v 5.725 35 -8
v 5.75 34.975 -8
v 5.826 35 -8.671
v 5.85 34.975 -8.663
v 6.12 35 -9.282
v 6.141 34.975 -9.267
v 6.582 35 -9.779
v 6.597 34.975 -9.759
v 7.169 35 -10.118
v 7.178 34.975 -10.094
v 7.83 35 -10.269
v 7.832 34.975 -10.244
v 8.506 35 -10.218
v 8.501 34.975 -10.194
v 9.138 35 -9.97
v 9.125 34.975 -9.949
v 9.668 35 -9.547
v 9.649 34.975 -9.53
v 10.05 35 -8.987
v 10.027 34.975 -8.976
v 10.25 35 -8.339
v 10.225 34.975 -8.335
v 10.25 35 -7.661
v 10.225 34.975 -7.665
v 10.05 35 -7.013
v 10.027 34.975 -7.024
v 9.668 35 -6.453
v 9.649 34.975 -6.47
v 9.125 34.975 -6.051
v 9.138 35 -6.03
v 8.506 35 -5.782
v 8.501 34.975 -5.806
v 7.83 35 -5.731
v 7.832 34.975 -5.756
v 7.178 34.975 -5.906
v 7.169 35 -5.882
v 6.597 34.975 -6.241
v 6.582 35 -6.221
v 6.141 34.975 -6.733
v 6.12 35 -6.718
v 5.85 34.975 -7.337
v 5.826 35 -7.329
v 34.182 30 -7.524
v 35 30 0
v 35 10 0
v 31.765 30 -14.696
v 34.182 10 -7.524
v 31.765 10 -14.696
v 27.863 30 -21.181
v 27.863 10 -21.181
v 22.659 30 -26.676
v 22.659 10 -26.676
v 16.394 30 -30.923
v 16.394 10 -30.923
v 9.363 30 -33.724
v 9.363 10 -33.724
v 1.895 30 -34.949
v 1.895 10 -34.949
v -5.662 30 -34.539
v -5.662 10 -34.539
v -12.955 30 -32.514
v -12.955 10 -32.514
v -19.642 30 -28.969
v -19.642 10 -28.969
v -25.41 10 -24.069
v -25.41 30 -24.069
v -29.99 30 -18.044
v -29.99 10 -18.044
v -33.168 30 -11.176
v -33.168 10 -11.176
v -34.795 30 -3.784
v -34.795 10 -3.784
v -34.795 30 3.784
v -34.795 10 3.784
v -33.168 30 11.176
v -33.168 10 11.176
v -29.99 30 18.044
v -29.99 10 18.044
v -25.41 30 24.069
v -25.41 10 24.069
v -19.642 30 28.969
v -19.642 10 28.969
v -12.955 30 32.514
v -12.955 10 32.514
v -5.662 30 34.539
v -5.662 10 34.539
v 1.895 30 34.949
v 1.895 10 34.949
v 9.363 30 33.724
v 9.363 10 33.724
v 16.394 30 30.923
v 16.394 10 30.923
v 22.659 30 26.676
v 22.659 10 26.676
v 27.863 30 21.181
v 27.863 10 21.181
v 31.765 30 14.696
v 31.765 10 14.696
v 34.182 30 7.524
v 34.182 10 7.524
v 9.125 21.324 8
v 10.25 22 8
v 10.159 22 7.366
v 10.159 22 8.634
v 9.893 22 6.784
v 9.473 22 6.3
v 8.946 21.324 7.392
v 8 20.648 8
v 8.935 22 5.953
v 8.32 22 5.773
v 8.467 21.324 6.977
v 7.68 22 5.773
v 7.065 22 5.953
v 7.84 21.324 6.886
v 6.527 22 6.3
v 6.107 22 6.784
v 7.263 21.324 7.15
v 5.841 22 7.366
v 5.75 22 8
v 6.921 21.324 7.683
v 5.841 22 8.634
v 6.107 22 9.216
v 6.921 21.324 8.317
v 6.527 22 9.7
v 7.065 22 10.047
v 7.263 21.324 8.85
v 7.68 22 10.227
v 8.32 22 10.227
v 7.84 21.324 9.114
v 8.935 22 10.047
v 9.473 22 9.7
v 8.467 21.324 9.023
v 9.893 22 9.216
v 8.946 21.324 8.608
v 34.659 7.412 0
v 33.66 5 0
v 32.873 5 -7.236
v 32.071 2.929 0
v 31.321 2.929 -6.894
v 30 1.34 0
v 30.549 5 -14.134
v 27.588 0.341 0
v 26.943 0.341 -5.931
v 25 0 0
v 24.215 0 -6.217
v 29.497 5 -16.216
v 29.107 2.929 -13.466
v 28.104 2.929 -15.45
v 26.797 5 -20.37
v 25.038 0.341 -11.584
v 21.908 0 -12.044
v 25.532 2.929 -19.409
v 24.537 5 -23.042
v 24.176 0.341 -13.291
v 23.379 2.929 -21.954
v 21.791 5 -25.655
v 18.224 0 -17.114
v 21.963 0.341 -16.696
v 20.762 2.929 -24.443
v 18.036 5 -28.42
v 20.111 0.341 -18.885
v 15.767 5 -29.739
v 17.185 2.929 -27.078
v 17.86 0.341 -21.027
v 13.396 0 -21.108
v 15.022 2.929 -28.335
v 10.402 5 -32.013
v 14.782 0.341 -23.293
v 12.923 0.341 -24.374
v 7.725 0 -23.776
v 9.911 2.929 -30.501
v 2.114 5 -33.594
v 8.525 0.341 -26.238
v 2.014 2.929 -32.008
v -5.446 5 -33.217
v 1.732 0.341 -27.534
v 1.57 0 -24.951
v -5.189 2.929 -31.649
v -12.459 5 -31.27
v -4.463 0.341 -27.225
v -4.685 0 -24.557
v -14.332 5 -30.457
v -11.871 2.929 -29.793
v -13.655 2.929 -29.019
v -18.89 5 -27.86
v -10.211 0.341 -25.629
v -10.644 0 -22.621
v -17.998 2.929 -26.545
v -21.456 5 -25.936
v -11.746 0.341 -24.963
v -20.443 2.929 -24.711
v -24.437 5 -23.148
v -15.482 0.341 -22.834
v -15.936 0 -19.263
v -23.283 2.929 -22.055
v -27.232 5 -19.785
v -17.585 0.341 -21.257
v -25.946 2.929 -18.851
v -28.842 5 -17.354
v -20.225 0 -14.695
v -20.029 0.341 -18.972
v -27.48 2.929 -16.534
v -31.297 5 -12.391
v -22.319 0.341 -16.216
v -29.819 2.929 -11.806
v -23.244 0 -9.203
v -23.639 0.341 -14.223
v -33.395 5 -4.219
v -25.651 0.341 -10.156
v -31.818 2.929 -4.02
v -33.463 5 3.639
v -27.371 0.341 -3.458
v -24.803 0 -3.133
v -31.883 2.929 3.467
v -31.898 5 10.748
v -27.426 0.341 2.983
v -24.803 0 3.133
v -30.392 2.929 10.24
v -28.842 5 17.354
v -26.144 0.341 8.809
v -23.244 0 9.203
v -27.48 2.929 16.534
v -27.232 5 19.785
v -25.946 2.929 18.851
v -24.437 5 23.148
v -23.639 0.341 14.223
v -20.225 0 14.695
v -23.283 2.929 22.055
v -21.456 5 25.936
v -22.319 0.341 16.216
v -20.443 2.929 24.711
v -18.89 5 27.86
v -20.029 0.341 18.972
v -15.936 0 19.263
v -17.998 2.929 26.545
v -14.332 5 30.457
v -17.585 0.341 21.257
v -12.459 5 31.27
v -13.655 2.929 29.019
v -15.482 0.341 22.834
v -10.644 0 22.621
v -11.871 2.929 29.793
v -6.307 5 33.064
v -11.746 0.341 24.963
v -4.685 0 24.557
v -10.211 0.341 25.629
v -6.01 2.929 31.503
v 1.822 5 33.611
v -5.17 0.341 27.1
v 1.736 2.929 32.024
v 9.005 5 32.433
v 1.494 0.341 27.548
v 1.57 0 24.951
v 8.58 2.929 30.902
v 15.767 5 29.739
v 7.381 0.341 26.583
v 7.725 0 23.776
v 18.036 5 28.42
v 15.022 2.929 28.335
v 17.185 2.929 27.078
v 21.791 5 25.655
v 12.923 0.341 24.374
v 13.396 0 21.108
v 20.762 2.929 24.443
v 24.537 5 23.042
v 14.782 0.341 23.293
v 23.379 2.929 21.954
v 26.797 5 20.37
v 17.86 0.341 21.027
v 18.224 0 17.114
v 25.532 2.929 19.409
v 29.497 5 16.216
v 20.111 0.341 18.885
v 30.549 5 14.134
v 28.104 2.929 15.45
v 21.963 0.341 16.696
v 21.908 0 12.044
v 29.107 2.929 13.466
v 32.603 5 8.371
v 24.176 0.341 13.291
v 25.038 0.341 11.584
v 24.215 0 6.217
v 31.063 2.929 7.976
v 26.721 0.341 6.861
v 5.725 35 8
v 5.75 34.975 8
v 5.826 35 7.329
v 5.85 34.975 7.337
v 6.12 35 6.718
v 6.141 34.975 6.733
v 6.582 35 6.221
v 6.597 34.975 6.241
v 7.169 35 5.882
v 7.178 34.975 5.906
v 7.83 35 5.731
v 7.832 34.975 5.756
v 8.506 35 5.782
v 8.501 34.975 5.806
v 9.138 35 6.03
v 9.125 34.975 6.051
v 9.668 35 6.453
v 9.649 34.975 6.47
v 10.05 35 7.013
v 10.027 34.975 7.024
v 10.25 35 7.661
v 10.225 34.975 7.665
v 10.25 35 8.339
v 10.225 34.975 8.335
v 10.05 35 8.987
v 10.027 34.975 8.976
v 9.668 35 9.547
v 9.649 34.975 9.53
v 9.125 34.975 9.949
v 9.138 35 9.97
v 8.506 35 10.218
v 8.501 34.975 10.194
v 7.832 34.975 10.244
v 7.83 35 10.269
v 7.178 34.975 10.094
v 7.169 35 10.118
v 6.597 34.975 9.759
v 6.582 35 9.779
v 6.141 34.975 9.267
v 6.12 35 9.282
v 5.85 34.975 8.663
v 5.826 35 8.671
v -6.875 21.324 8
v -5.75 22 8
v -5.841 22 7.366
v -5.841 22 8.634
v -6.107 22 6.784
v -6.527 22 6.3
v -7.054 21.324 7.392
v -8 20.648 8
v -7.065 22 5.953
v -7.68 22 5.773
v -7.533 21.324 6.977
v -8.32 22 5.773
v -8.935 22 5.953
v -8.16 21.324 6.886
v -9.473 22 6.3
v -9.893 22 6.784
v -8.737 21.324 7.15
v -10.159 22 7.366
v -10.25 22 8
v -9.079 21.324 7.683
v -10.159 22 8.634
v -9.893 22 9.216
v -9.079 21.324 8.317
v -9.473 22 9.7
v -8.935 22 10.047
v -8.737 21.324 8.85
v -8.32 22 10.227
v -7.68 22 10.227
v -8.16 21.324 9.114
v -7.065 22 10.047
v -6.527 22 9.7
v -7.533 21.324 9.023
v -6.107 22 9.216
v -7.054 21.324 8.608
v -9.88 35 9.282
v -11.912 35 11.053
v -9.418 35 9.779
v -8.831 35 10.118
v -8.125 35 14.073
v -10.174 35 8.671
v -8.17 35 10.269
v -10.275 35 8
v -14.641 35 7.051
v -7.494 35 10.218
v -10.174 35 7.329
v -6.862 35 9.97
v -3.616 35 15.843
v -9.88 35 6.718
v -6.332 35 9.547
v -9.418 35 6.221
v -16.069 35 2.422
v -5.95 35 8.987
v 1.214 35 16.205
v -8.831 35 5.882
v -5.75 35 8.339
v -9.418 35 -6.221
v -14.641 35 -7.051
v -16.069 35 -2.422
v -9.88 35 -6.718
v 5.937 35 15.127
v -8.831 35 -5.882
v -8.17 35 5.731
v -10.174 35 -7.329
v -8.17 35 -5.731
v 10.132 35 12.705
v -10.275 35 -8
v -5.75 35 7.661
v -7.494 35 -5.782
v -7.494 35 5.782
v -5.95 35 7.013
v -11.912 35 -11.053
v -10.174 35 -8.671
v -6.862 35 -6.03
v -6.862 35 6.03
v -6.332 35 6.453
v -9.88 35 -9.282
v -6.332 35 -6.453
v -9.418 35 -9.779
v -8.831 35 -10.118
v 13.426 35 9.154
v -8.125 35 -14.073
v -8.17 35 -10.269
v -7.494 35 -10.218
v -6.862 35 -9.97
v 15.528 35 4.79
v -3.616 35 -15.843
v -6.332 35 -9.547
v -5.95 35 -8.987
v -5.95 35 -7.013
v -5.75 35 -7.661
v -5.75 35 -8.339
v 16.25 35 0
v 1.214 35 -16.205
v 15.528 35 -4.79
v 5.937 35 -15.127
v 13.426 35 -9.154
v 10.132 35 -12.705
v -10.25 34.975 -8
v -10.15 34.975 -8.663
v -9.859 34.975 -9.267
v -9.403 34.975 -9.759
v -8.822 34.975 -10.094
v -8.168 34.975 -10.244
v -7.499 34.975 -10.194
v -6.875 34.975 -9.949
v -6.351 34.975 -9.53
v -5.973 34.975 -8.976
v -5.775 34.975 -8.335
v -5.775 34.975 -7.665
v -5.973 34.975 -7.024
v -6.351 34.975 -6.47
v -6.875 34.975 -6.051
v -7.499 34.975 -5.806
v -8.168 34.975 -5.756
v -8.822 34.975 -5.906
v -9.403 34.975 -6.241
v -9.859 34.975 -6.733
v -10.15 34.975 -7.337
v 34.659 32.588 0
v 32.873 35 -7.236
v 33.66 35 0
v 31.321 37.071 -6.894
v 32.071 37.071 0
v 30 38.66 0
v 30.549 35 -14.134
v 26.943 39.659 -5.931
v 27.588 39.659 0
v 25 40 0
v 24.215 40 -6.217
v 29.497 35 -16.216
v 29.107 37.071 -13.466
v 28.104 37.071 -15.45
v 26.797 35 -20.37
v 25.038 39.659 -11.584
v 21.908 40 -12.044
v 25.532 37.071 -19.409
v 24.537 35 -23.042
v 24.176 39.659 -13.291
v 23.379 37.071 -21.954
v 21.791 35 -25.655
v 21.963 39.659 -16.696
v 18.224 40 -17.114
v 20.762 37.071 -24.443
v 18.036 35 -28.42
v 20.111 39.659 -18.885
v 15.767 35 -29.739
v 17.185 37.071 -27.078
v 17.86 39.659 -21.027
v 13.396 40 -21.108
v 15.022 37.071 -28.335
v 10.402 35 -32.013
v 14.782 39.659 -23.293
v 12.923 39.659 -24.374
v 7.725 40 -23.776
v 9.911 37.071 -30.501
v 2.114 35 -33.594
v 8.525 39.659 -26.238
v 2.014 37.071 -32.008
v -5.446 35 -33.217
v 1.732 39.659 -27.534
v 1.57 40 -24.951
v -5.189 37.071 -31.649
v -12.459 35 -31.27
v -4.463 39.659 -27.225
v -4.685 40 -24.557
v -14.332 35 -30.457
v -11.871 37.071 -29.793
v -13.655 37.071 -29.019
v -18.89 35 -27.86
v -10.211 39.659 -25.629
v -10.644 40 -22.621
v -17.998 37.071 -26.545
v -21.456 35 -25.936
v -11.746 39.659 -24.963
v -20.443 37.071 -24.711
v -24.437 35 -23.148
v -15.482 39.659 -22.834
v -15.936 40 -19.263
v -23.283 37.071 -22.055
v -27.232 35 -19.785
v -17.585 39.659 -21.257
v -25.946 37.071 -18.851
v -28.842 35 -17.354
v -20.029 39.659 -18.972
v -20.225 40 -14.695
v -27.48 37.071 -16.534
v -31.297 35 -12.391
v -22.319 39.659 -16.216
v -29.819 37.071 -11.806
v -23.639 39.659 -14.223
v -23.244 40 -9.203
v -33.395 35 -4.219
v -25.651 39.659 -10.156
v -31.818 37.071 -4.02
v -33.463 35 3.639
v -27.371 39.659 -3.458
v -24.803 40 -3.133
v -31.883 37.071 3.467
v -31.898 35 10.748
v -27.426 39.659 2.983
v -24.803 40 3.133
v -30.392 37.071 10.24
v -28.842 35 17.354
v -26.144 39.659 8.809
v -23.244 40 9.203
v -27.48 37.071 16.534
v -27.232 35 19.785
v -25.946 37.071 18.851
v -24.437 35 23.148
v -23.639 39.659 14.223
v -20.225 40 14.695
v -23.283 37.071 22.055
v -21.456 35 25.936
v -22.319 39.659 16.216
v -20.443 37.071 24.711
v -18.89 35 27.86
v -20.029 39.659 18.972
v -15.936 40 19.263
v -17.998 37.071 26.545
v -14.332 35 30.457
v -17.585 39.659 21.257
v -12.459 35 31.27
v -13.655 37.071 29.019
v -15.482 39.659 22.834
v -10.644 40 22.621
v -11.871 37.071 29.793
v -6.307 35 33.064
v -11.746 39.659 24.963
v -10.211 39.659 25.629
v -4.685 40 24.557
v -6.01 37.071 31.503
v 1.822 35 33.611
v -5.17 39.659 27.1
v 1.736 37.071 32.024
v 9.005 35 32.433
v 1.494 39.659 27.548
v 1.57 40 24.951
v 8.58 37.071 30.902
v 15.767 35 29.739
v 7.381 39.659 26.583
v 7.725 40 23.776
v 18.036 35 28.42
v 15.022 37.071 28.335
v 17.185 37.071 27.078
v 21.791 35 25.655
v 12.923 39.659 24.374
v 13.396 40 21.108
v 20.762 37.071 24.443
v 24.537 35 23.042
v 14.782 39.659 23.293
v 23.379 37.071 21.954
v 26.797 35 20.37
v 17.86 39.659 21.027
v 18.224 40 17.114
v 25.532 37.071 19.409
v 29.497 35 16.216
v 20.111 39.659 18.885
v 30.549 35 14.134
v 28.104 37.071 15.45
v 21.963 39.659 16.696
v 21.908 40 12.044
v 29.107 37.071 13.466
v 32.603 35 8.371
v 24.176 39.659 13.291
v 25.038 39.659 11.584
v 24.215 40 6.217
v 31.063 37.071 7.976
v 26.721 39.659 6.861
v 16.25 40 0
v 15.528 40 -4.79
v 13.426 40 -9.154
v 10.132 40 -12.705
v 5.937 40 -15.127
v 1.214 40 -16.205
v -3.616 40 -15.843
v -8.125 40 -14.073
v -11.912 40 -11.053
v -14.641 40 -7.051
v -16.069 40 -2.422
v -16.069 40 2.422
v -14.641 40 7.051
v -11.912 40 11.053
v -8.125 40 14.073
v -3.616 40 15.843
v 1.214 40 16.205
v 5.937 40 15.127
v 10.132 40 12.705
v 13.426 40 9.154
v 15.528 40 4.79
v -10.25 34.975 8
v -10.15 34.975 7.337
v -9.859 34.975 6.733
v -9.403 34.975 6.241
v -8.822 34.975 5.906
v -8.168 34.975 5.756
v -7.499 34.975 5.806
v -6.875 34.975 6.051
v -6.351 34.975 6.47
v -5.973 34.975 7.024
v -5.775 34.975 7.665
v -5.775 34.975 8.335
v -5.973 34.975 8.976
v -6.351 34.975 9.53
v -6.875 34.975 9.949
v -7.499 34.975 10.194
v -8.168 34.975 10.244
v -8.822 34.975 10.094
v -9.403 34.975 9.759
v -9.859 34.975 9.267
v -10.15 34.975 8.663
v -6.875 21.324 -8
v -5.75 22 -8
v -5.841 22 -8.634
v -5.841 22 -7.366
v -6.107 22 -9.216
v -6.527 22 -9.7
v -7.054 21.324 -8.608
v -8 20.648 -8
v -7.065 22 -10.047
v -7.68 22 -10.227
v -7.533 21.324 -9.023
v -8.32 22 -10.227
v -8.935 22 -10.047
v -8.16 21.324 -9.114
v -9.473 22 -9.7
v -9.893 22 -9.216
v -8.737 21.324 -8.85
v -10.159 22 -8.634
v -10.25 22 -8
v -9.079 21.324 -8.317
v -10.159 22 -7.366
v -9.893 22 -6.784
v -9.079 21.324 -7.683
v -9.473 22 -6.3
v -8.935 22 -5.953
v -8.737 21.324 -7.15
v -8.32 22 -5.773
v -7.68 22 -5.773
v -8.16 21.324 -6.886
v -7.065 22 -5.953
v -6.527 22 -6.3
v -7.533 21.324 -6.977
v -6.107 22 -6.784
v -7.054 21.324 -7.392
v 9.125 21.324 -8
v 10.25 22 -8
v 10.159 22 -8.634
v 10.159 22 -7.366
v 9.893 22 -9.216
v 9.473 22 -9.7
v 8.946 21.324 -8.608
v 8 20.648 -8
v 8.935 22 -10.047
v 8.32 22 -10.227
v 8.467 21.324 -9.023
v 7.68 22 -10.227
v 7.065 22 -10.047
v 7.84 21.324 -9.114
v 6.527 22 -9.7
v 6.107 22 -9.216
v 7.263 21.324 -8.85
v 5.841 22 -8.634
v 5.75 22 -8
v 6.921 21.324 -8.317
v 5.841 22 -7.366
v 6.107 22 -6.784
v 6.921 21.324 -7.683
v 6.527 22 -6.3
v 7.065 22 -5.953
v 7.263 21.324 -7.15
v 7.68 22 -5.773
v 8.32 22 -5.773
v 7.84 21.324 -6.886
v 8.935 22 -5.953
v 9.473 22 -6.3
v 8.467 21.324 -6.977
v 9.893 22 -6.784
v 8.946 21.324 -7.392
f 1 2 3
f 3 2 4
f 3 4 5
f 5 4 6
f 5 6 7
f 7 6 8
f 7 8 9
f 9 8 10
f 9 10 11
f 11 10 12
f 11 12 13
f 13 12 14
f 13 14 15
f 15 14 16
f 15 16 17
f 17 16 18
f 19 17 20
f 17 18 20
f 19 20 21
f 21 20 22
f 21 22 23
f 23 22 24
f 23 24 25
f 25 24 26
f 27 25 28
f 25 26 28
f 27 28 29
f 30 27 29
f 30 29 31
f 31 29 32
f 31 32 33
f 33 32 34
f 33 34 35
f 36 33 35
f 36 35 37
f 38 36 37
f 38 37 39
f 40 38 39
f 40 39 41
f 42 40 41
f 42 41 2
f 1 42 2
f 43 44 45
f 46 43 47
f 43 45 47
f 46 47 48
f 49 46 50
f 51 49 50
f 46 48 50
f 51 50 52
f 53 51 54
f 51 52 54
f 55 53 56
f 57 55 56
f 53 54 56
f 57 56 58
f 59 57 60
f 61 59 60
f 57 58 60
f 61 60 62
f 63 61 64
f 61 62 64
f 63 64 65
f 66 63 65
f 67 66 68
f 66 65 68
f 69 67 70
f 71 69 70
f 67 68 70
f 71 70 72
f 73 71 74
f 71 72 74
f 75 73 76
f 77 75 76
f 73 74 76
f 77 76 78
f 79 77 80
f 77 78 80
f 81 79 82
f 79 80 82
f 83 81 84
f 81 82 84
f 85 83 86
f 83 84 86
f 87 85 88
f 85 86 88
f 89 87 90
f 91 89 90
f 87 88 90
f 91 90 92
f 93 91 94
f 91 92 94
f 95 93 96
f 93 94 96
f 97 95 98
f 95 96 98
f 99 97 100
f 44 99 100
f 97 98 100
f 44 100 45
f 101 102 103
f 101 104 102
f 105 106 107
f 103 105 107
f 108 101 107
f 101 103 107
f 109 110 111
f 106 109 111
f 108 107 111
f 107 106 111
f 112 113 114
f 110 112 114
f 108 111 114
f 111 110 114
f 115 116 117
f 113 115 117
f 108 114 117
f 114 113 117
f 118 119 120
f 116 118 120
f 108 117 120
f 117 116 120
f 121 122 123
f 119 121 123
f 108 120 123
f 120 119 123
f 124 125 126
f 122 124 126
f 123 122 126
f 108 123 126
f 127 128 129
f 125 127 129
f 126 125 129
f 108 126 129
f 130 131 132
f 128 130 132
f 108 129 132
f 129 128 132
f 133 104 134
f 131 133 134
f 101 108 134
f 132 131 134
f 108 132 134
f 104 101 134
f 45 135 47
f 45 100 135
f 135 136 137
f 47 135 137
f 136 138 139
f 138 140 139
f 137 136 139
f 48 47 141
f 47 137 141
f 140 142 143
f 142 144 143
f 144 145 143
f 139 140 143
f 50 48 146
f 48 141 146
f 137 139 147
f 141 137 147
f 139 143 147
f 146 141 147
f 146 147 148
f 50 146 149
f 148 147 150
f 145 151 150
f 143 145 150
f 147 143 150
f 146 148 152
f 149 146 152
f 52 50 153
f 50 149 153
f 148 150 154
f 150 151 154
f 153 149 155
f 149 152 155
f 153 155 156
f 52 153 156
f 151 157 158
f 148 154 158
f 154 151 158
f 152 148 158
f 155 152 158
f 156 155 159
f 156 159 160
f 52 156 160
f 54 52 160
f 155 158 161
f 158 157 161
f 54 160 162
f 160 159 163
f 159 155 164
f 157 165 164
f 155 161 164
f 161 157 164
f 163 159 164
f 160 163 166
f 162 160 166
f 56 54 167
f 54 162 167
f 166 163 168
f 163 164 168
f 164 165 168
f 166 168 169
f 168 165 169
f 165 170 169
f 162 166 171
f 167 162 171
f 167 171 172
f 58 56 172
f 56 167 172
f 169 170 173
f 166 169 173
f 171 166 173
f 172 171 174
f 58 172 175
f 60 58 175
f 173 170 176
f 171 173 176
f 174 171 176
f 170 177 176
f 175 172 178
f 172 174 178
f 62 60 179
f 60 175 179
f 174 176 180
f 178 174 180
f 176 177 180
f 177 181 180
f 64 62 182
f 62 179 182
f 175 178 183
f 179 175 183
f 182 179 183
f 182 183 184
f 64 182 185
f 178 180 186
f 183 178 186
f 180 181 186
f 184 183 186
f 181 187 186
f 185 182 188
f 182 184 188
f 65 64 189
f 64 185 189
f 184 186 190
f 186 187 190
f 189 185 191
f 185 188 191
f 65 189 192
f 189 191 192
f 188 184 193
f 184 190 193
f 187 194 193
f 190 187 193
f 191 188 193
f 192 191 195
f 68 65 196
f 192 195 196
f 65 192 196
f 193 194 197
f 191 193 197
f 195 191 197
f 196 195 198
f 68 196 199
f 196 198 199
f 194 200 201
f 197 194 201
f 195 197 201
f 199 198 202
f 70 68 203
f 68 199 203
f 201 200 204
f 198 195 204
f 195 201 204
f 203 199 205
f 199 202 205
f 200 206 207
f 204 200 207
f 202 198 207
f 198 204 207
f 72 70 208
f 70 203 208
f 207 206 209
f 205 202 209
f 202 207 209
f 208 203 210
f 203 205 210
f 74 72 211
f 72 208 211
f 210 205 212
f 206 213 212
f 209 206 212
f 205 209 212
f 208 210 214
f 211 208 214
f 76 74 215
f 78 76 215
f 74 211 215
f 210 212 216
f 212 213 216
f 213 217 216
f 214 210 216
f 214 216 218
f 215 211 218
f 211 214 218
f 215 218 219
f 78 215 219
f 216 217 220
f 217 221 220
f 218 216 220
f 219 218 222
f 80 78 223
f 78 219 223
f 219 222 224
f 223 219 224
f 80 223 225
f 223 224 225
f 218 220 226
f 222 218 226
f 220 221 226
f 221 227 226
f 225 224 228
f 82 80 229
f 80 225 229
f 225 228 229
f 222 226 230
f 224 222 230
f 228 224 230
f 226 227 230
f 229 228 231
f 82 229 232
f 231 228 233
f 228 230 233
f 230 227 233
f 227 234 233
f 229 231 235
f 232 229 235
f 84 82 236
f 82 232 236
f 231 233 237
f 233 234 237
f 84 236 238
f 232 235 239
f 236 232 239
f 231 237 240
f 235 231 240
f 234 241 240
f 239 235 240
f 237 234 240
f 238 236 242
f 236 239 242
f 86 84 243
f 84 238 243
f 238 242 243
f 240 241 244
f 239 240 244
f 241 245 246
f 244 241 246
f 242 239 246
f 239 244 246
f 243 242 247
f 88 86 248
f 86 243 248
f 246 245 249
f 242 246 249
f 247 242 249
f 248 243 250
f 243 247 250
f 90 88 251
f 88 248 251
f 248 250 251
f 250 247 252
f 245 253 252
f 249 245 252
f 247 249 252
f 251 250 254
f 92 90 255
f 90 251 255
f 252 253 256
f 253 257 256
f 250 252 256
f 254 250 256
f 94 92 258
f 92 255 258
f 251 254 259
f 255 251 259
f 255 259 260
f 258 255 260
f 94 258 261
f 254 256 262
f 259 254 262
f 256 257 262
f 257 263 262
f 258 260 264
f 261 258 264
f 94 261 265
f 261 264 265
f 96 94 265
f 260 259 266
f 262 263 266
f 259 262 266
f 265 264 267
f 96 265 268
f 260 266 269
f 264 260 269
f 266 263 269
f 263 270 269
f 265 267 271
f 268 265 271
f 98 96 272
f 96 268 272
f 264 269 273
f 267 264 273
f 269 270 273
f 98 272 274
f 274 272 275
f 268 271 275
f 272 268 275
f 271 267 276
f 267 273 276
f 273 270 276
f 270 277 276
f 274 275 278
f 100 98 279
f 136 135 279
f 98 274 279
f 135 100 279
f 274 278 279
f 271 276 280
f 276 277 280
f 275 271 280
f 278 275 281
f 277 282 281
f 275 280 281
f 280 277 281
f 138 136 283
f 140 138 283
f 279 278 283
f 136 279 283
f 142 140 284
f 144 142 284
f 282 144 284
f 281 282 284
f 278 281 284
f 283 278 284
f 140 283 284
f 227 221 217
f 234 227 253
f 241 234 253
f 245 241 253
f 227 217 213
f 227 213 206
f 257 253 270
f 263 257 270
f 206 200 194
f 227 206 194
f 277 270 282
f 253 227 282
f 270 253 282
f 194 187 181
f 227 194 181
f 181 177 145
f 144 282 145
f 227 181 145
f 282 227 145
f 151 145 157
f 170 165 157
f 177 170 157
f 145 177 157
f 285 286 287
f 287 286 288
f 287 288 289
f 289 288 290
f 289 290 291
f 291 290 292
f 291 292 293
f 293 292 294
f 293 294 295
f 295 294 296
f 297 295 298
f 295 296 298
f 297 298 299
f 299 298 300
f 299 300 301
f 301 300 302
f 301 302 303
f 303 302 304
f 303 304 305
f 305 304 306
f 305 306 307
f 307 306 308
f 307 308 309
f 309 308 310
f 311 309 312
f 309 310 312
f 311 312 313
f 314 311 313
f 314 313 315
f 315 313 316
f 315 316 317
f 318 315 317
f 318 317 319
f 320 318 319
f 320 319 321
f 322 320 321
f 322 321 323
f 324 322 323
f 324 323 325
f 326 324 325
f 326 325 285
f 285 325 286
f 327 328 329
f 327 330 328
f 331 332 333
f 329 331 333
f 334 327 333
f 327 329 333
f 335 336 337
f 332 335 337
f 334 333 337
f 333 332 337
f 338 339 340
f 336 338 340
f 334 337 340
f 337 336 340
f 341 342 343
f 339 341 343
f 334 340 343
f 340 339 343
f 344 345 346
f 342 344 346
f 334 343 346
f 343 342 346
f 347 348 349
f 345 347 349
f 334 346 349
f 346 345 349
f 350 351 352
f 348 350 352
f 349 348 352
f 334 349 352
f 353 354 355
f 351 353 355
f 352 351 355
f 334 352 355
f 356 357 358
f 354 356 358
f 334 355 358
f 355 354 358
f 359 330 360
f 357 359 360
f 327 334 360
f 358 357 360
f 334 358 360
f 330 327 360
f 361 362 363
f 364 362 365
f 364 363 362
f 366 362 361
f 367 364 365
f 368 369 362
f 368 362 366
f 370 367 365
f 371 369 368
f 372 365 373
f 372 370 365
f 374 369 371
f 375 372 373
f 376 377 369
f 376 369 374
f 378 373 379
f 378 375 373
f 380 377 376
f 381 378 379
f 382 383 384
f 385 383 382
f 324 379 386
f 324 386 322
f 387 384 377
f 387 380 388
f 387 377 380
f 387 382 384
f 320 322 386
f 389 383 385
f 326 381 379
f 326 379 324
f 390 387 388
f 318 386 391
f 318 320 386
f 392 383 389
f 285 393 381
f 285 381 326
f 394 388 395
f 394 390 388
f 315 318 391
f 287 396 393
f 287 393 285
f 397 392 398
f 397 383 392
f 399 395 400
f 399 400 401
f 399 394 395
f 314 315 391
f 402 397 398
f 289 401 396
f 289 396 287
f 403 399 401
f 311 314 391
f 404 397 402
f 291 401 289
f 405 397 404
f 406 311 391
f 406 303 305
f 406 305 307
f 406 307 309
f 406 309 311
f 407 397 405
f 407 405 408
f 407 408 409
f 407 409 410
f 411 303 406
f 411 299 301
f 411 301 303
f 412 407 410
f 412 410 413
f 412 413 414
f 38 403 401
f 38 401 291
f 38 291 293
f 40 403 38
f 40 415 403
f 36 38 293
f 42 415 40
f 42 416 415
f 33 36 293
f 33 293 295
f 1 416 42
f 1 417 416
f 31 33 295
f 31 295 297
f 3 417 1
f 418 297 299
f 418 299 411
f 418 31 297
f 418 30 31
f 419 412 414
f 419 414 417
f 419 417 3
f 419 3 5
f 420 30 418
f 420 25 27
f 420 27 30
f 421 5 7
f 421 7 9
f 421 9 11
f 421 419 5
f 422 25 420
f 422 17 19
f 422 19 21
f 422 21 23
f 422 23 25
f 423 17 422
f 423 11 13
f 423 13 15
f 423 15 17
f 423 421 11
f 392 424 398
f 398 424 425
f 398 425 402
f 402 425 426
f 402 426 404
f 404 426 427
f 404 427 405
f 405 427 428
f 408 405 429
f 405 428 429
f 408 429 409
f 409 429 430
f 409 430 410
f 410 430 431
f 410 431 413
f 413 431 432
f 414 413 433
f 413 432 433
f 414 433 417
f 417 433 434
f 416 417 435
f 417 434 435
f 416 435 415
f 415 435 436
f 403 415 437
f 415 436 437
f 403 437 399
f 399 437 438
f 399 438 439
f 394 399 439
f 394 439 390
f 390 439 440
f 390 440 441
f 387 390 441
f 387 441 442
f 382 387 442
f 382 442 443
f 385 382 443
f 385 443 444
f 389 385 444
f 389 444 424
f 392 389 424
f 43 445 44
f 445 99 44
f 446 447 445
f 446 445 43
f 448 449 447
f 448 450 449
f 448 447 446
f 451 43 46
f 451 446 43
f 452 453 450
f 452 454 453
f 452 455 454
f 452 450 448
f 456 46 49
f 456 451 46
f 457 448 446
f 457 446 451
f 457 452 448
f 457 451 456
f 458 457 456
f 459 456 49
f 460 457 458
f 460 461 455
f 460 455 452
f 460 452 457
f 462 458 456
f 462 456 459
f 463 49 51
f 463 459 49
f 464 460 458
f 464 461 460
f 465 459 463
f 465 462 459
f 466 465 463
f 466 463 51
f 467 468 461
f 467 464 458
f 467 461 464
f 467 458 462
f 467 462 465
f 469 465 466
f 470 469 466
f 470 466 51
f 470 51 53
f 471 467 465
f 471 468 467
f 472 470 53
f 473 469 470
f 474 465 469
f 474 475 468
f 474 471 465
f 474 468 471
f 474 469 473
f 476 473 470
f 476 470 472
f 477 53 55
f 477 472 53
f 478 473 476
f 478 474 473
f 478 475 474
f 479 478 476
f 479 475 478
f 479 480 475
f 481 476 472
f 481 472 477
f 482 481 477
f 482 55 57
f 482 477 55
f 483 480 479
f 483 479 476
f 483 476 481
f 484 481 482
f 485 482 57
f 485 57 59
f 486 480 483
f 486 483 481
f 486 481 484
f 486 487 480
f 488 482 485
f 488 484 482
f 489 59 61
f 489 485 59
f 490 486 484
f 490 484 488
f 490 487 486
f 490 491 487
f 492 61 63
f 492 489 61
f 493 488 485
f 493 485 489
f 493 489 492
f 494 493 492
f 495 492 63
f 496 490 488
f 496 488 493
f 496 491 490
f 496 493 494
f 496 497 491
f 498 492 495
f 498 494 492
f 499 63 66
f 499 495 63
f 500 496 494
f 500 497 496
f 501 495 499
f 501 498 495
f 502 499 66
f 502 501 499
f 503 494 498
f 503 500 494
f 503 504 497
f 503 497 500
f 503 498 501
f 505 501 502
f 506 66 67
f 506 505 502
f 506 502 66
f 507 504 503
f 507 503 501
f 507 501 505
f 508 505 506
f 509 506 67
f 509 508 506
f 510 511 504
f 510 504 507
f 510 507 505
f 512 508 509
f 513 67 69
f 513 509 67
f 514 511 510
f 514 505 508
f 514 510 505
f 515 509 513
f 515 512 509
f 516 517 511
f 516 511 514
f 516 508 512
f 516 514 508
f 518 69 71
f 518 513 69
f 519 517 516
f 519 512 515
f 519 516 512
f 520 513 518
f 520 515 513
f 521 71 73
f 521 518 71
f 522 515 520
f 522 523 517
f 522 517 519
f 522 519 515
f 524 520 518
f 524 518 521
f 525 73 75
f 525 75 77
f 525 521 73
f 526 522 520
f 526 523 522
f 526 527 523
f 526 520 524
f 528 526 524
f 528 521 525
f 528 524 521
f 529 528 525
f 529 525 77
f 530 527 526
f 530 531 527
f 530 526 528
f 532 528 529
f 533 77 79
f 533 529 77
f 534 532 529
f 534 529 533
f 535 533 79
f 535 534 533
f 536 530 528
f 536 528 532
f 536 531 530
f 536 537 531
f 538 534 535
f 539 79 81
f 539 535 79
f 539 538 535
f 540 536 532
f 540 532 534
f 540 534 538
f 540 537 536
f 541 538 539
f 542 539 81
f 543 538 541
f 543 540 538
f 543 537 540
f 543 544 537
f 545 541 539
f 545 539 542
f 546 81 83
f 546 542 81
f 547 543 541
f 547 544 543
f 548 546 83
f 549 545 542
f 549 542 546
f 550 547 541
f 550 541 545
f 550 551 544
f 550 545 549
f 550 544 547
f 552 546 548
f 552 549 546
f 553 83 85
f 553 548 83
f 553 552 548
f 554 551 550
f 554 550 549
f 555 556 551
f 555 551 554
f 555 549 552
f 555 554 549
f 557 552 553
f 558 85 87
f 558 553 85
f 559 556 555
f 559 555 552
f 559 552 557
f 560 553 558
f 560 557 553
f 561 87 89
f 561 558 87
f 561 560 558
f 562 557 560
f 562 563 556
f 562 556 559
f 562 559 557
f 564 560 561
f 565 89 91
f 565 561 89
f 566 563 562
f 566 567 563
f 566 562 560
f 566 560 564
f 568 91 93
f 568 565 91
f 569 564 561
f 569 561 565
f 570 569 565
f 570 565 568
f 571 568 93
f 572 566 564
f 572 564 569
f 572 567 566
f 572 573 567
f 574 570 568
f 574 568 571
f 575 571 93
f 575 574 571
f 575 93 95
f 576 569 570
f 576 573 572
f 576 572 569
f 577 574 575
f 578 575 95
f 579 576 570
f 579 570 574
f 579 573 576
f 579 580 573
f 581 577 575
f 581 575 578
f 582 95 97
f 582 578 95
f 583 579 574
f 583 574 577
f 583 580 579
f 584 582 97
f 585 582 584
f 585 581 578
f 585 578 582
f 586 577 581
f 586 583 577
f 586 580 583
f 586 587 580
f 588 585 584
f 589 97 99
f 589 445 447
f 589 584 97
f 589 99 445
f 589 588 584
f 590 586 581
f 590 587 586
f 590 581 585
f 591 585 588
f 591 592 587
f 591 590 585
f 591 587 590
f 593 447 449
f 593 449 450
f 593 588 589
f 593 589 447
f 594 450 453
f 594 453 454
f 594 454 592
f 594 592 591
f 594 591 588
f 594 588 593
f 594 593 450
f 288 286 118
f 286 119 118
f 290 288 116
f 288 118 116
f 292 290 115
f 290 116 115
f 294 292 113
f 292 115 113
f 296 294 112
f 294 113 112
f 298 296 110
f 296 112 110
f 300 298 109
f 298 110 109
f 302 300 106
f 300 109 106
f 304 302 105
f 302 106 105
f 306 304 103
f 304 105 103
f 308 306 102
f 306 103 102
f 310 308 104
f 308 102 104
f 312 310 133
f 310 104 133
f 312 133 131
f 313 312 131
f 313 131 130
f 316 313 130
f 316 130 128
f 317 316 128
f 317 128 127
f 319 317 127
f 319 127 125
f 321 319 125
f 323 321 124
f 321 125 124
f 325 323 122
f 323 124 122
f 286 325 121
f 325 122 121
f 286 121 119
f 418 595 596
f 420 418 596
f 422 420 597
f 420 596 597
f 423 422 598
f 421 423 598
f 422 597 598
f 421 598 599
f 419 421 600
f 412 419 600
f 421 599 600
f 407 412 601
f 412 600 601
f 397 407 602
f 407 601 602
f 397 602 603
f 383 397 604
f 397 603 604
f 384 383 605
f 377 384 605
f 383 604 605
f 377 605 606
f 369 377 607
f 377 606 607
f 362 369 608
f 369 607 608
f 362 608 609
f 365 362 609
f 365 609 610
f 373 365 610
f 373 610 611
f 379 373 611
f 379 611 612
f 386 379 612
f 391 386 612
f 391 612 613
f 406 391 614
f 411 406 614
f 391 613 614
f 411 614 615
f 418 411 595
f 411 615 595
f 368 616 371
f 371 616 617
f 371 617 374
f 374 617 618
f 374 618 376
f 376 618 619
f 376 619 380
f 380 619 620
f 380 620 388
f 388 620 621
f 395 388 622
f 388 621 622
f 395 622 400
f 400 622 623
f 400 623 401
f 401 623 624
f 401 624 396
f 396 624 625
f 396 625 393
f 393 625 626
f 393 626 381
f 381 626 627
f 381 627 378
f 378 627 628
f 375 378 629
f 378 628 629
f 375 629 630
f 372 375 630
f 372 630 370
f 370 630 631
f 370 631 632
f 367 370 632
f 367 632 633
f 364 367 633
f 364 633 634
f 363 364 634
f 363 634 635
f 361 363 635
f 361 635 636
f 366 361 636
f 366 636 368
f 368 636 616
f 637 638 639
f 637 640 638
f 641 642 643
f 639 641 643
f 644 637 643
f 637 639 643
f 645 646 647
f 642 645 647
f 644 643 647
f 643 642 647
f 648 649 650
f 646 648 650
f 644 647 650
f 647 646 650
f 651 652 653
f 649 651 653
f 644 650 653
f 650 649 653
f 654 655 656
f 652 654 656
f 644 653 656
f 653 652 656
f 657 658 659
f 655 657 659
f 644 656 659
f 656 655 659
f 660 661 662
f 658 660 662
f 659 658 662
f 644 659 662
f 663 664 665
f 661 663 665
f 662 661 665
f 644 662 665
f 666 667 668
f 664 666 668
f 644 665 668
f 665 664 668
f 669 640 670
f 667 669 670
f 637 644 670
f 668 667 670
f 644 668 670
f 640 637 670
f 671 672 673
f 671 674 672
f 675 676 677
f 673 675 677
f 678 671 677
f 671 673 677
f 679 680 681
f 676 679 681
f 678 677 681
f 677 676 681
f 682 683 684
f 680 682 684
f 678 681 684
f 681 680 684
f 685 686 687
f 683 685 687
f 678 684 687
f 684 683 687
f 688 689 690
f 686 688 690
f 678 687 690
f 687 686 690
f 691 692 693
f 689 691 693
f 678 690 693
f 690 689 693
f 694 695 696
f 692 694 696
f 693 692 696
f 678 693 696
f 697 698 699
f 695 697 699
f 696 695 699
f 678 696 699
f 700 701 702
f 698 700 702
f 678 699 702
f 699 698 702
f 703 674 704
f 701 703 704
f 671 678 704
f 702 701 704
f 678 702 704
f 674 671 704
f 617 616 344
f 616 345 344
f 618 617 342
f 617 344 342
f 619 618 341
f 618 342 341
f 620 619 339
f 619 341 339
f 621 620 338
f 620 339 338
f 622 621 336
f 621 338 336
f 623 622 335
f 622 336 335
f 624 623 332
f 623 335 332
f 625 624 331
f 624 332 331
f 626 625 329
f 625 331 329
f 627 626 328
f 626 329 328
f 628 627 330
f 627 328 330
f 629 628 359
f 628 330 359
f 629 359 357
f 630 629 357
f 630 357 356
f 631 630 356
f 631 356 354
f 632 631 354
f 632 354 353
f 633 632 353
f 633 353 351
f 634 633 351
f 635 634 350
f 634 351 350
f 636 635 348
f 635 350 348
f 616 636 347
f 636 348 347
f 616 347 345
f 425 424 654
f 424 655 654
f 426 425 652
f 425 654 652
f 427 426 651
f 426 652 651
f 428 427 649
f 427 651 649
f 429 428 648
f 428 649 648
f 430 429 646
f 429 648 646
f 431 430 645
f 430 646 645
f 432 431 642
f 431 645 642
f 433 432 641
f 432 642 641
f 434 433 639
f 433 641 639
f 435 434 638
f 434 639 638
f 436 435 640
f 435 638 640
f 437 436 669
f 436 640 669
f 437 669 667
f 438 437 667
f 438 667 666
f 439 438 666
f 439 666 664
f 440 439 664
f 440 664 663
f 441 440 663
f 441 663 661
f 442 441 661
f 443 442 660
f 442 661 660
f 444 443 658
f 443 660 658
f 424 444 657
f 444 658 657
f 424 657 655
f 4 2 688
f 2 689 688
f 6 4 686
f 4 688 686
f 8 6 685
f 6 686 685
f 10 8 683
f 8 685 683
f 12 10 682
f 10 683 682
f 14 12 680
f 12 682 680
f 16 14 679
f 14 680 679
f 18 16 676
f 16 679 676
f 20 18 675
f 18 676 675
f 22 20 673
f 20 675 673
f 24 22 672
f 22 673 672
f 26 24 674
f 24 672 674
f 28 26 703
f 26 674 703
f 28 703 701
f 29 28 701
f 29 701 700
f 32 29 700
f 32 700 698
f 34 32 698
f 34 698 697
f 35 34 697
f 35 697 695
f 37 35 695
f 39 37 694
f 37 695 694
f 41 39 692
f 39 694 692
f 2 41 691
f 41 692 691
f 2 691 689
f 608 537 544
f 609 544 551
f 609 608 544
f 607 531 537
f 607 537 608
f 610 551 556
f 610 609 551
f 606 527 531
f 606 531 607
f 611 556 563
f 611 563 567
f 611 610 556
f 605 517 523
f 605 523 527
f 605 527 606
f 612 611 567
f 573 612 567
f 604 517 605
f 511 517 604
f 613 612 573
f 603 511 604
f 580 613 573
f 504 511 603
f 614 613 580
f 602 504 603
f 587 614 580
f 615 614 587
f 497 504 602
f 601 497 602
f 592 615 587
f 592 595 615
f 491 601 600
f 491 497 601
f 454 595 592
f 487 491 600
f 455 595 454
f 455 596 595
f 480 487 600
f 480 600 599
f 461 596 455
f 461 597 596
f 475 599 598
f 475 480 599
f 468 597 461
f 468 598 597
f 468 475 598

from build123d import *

# Parameters (mm, degrees)
SKETCH1_R                      = 35
BOSS_EXTRUDE1_DEPTH            = 40
SKETCH2_R                      = 16.25
CUT_EXTRUDE1_DEPTH             = 5
M4_CLEARANCE_HOLE1_D           = 4.5
M4_CLEARANCE_HOLE1_DEPTH       = 13
M4_CLEARANCE_HOLE1_CSINK_D     = 4.55
M4_CLEARANCE_HOLE1_CSINK_ANGLE = 90
M4_CLEARANCE_HOLE1_TIP         = 1.351936393
FILLET4_R                      = 10


with BuildPart() as part:
    # Sketch1 → Boss-Extrude1 (new body)
    with BuildSketch(Plane(origin=(0, 0, 0), x_dir=(1, 0, 0), z_dir=(0, 1, 0))):
        Circle(SKETCH1_R)
    extrude(amount=BOSS_EXTRUDE1_DEPTH)

    # Sketch2 → Cut-Extrude1 (cut)
    with BuildSketch(Plane(origin=(0, 40, 0), x_dir=(1, 0, 0), z_dir=(0, 1, 0))):
        Circle(SKETCH2_R)
    extrude(amount=-CUT_EXTRUDE1_DEPTH, mode=Mode.SUBTRACT)

    # M4 Clearance Hole1
    with Locations(Plane(origin=(0, 35, 0), x_dir=(1, 0, 0), z_dir=(0, 1, 0))):
        with Locations((-8, 8), (8, 8), (8, -8), (-8, -8)):
            CounterSinkHole(M4_CLEARANCE_HOLE1_D / 2, M4_CLEARANCE_HOLE1_CSINK_D / 2, depth=M4_CLEARANCE_HOLE1_DEPTH, counter_sink_angle=M4_CLEARANCE_HOLE1_CSINK_ANGLE)
            with Locations((0, 0, -(M4_CLEARANCE_HOLE1_DEPTH + M4_CLEARANCE_HOLE1_TIP / 2))):  # 118° drill point
                Cone(0, M4_CLEARANCE_HOLE1_D / 2, M4_CLEARANCE_HOLE1_TIP, mode=Mode.SUBTRACT)

    # Fillet4
    fillet4_edges = [part.edges().sort_by_distance(p)[0] for p in [
        (-35, 0, 0),
        (-35, 40, 0),
    ]]
    fillet(fillet4_edges, radius=FILLET4_R)


solid = part.part
